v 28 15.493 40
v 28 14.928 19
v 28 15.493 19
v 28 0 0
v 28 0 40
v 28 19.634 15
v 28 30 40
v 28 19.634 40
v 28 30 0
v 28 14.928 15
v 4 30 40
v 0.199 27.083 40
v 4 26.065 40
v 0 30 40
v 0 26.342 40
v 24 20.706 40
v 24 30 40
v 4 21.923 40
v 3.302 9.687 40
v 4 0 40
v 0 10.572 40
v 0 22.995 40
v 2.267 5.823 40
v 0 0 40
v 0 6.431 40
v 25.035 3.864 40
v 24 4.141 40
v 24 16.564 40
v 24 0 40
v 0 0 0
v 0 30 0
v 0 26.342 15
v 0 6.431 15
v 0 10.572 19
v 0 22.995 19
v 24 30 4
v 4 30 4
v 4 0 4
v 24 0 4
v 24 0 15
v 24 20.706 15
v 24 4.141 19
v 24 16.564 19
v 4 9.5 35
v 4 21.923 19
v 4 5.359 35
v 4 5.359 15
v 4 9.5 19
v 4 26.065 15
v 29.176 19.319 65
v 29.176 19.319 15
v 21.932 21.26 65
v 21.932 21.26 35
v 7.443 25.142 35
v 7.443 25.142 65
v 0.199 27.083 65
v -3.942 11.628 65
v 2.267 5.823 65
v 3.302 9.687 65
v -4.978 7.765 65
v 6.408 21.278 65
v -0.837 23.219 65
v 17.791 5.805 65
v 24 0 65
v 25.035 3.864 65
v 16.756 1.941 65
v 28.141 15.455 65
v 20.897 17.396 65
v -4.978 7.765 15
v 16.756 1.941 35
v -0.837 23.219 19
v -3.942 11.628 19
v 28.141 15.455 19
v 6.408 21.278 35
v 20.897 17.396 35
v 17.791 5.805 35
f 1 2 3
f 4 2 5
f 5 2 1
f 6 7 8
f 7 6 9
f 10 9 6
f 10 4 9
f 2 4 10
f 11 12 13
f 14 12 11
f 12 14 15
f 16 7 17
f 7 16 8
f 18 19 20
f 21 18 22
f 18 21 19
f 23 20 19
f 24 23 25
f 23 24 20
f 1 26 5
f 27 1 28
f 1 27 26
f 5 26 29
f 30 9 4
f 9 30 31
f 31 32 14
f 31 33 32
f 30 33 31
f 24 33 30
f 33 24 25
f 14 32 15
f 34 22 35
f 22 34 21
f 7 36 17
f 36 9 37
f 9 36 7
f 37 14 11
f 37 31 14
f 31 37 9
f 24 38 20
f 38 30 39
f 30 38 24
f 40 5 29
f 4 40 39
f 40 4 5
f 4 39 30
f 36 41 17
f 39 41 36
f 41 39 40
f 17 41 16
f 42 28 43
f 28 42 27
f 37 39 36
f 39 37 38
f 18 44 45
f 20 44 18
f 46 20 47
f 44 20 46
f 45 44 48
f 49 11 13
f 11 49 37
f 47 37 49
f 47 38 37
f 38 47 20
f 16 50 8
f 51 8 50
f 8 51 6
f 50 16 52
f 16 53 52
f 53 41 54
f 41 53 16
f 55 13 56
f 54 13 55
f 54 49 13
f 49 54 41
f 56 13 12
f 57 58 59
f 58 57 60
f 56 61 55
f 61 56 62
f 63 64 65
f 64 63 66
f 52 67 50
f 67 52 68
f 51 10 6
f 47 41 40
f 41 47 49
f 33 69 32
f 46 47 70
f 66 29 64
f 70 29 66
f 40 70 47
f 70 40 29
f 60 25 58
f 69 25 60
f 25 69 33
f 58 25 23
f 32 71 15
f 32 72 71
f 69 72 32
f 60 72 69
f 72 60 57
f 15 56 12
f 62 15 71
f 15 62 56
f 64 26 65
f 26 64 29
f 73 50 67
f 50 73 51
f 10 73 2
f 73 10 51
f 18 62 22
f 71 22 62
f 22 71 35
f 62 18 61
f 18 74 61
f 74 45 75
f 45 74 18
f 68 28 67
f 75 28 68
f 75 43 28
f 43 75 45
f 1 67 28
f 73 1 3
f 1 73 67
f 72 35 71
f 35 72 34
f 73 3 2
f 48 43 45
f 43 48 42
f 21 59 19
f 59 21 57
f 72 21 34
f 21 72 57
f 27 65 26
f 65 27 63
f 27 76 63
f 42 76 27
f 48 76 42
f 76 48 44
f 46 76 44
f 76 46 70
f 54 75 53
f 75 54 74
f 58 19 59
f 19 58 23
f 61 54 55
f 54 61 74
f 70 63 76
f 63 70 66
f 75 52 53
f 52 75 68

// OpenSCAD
/*
  ApisLM Universal Hive Mount
  Zero-Cost Hardware Component
  
  Parametric OpenSCAD design to hook a smartphone onto a standard 
  Langstroth hive bottom board for EntranceMonitor.tsx analysis.
*/

// --- Parameters ---
phone_thickness = 12;      // Thickness of phone with case (mm)
phone_width = 80;          // Width of the phone (mm)
hive_board_thickness = 20; // Standard Langstroth bottom board thickness (mm)
mount_width = 30;          // Width of the printable mount (mm)
wall_thickness = 4;        // Sturdiness of the walls (mm)
angle = 75;                // Viewing angle for the camera (degrees)

module hive_hook() {
    difference() {
        // Outer hook block
        cube([hive_board_thickness + (wall_thickness*2), mount_width, 40]);
        // Inner cutout for the hive board
        translate([wall_thickness, -1, wall_thickness])
            cube([hive_board_thickness, mount_width + 2, 40]);
    }
}

module phone_cradle() {
    // The cradle that holds the phone
    rotate([0, 0, angle])
    difference() {
        cube([phone_thickness + (wall_thickness*2), mount_width, 50]);
        translate([wall_thickness, -1, wall_thickness])
            cube([phone_thickness, mount_width + 2, 50]);
        // Camera/Sensor cutout
        translate([-1, mount_width/4, 20])
            cube([phone_thickness + (wall_thickness*2) + 2, mount_width/2, 35]);
    }
}

module universal_mount() {
    union() {
        hive_hook();
        // Attach cradle to the hook at the optimal entrance angle
        translate([hive_board_thickness + wall_thickness, 0, 15])
            phone_cradle();
    }
}

// Render the mount
universal_mount();
